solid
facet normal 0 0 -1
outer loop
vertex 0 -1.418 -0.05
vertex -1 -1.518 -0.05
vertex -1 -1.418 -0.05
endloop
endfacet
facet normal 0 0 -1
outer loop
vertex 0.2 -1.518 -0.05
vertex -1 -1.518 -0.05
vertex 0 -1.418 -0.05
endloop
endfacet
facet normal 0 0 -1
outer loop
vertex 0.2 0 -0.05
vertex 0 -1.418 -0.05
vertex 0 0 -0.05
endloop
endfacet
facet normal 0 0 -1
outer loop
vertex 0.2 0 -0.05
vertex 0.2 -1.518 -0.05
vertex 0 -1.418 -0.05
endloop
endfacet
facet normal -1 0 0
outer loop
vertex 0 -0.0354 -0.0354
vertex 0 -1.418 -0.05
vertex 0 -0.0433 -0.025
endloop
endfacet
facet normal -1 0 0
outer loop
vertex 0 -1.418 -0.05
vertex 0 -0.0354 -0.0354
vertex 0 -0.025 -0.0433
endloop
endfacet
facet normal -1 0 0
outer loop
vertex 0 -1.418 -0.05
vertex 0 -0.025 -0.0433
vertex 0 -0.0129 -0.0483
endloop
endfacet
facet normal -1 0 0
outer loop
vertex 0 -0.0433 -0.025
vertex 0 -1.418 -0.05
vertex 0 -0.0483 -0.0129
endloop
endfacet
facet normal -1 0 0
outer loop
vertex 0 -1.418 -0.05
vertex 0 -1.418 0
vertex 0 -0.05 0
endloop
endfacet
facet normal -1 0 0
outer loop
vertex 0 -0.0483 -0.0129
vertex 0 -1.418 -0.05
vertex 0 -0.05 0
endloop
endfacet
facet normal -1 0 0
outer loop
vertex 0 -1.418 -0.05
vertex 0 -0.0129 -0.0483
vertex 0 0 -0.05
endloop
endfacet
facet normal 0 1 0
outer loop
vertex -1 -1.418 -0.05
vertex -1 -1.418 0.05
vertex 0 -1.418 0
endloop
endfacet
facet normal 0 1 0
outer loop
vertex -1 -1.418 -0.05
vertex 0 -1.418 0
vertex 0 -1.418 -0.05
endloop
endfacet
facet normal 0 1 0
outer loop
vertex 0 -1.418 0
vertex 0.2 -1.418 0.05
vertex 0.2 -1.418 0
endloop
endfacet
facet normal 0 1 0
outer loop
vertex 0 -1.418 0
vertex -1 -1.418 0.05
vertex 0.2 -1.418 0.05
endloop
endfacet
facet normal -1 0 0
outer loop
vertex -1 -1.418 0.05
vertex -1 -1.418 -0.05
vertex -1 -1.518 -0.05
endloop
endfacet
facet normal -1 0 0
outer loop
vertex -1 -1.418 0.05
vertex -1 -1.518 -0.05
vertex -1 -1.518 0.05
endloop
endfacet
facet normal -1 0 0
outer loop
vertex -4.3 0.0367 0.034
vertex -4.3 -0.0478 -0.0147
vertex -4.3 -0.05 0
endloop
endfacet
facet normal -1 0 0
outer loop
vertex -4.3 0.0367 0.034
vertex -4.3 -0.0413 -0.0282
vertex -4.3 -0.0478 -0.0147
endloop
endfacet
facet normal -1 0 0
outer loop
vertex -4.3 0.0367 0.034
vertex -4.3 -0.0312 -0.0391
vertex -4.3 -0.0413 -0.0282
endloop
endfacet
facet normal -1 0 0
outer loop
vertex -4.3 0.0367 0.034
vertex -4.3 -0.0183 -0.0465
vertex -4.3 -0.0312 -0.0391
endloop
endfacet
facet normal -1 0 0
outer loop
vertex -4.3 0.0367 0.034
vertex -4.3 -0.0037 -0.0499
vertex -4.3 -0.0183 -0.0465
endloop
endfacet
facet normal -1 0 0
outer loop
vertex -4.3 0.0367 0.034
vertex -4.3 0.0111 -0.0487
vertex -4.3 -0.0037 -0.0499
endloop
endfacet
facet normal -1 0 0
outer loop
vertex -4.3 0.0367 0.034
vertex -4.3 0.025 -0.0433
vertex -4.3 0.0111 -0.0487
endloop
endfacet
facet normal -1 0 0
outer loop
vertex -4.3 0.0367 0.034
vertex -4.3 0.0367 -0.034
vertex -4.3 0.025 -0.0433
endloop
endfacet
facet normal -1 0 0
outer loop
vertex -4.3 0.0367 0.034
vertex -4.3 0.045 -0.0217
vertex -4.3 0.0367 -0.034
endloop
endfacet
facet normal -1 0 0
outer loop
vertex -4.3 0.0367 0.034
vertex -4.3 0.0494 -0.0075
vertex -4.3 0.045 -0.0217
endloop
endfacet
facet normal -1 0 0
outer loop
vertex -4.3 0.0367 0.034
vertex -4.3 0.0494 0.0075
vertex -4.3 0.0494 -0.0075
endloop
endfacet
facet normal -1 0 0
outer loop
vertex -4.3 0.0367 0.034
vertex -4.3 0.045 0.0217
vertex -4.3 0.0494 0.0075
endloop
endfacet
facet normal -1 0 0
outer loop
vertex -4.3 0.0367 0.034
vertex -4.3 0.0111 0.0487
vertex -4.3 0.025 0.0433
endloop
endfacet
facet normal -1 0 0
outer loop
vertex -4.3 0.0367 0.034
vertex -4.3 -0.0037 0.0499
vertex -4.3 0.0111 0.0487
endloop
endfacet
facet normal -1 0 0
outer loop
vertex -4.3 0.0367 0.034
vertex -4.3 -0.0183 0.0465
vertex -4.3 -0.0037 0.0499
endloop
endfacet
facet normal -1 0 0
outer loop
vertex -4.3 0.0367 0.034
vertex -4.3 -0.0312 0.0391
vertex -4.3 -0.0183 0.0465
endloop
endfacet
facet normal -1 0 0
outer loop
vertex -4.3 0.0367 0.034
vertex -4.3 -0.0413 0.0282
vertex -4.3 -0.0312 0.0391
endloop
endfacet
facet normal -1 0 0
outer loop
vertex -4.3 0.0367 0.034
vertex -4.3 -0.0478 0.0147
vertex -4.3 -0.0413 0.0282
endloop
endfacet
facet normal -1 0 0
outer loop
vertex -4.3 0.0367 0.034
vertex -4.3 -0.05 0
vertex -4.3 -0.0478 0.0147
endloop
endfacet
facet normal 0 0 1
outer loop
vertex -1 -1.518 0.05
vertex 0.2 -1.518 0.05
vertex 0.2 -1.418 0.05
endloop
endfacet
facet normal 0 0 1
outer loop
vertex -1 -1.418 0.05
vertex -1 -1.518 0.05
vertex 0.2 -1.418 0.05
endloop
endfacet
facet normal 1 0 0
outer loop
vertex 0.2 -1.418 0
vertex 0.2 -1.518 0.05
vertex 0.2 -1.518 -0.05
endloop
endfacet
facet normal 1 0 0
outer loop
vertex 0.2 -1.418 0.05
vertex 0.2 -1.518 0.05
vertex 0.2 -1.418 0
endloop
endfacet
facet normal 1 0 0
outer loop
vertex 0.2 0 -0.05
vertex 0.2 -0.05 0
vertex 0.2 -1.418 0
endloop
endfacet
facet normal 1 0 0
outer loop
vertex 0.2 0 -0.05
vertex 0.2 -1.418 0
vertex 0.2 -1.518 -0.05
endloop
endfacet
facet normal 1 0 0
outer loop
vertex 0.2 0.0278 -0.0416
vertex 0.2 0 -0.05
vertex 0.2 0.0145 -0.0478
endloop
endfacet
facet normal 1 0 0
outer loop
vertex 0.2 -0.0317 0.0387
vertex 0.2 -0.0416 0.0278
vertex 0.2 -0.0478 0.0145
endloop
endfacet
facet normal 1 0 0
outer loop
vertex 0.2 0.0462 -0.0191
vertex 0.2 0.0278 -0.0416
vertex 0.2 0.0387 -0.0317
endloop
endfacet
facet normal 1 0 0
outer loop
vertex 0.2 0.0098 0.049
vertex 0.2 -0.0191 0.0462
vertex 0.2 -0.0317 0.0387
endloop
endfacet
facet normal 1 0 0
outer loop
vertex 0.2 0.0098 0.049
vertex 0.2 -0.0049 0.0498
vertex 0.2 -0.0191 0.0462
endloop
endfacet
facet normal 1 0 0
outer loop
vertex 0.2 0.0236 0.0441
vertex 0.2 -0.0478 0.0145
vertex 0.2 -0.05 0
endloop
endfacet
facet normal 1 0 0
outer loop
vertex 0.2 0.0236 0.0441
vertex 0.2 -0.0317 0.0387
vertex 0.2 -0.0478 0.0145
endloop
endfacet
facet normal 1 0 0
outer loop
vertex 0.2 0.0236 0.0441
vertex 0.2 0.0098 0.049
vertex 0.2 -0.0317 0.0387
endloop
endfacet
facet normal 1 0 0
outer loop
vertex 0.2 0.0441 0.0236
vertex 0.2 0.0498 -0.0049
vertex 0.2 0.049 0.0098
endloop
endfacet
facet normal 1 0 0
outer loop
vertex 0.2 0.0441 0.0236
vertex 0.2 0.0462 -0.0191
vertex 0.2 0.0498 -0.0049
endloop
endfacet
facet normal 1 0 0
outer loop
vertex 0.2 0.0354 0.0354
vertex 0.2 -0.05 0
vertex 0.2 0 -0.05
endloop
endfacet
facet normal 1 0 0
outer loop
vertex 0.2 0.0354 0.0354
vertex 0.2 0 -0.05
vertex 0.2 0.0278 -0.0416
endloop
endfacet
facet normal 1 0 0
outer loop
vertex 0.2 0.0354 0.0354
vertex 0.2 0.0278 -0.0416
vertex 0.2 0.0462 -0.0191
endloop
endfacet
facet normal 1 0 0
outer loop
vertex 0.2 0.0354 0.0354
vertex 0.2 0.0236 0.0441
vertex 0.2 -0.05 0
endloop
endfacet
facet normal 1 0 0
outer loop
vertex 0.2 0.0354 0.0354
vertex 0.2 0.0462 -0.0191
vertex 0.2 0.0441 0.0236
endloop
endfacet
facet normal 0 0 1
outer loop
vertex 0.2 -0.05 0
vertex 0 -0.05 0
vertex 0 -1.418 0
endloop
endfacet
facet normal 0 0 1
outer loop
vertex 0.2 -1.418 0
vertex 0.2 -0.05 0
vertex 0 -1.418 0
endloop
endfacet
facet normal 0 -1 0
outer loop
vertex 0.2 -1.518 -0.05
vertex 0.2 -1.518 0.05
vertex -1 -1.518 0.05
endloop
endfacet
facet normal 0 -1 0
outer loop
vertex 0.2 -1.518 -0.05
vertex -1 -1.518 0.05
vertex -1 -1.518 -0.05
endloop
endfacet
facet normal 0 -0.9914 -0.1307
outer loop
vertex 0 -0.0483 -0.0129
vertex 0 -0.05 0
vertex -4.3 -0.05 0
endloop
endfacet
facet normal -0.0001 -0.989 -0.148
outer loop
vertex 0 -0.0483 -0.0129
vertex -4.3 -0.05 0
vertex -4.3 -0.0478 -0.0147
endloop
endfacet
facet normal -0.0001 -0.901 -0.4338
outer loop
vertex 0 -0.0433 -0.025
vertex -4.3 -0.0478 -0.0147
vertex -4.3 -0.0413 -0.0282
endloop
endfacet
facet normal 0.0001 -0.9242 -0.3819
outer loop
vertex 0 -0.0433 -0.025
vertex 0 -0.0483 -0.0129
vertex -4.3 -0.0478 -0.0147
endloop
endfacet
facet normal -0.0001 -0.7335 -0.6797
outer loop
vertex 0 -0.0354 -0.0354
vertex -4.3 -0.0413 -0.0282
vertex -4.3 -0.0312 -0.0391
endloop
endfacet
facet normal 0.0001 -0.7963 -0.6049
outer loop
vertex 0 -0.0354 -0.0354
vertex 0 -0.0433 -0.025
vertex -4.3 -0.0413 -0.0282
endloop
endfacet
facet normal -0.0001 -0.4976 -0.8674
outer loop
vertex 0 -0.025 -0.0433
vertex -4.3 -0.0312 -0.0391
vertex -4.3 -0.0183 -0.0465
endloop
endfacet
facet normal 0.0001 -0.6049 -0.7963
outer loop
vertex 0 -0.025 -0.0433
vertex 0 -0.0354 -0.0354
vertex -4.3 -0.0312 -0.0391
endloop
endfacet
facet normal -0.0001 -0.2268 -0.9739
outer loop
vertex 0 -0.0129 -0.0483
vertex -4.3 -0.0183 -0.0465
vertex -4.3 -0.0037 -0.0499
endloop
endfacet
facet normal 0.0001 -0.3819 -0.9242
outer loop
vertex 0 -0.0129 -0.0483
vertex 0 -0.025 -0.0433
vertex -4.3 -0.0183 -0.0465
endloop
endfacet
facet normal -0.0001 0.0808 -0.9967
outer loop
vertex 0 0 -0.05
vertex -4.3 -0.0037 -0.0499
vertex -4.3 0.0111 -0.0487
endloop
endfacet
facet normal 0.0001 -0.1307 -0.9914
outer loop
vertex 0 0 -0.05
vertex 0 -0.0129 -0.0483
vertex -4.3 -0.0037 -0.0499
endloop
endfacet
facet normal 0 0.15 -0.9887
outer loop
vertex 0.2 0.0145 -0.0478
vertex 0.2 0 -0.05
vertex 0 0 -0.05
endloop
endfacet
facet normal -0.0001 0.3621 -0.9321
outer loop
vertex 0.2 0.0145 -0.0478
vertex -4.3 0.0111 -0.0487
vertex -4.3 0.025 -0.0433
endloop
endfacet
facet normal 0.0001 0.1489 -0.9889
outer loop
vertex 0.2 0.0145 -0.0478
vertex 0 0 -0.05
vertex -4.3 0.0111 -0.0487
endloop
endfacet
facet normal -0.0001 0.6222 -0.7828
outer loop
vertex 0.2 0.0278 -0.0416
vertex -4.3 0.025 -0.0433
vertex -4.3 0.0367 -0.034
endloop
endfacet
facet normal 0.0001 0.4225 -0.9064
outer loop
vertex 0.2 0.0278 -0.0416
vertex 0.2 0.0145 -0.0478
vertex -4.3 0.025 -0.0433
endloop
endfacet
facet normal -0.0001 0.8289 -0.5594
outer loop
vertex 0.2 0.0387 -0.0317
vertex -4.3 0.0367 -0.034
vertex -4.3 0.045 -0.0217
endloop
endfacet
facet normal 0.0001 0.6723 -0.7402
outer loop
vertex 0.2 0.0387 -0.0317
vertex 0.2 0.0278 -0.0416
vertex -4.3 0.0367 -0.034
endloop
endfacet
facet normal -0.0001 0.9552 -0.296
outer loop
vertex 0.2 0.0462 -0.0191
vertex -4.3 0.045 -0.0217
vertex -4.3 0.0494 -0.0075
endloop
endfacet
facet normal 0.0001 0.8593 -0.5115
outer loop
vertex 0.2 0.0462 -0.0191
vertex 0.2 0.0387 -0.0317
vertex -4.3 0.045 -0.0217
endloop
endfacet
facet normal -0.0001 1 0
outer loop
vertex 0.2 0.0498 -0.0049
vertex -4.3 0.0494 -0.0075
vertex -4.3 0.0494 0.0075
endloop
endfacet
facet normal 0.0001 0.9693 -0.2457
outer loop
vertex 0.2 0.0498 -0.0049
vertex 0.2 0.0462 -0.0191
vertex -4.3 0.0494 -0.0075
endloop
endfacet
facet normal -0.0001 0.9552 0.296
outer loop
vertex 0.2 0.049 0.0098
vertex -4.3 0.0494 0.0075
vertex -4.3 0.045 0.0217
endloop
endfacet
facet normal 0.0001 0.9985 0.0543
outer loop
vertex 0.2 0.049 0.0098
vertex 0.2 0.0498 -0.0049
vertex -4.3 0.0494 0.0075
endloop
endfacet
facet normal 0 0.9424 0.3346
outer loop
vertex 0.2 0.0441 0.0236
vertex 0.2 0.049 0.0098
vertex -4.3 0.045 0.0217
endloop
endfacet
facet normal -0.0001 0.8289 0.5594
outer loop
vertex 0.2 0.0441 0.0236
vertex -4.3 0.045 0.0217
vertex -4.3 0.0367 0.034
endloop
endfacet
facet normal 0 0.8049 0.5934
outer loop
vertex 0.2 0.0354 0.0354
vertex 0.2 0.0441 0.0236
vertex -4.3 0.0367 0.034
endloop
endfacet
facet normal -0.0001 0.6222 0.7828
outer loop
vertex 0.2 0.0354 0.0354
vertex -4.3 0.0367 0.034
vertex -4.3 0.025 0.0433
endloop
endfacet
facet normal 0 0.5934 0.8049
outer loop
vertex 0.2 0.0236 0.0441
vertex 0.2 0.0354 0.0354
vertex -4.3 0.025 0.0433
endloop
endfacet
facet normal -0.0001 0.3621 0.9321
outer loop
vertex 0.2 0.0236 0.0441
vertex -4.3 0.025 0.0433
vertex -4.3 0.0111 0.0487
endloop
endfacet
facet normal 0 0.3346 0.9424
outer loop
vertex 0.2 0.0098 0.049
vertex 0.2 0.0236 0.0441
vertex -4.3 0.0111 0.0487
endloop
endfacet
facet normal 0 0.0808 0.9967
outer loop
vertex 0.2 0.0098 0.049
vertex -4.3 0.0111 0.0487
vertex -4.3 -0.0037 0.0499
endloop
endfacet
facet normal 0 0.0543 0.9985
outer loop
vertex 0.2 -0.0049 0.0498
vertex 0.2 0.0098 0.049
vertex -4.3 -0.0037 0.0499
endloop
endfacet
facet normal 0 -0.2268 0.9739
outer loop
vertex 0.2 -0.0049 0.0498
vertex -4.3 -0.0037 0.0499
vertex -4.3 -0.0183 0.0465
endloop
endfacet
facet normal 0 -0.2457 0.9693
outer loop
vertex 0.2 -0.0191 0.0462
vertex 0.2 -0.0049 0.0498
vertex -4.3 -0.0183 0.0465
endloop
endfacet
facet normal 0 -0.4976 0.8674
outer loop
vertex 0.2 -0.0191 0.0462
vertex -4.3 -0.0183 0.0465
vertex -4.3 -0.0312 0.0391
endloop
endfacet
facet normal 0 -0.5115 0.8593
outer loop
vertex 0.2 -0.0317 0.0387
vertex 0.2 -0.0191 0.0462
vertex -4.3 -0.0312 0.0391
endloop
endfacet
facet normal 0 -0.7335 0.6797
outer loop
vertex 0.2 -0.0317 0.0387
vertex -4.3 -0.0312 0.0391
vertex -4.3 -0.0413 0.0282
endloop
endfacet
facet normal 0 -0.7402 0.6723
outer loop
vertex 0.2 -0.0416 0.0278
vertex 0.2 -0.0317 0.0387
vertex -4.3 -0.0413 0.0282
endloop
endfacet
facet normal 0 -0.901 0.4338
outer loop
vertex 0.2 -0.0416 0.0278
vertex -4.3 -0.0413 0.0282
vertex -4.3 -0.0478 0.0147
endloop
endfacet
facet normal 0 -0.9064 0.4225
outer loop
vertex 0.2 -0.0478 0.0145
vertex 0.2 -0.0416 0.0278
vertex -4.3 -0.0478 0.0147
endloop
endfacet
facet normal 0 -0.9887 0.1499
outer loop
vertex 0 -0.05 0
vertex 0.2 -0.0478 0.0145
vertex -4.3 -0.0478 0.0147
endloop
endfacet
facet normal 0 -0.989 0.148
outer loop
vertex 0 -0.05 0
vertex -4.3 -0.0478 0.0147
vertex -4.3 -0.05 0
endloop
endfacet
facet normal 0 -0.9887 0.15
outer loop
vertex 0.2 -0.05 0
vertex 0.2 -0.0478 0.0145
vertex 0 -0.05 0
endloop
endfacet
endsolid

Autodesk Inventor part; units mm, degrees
ref_plane "YZ Plane" through (0, 0, 0) normal (1, 0, 0) x (0, 1, 0)
ref_plane "XZ Plane" through (0, 0, 0) normal (0, 1, 0) x (-1, 0, 0)
ref_plane "XY Plane" through (0, 0, 0) normal (0, 0, 1) x (1, 0, 0)
sketch "Sketch1" plane through (0, 0, 0) normal (1, 0, 0) x (0, 1, 0)
  circle A0 centre (0, 0) radius 0.05
  line L0 (0, 0) -> (-1.468, 0)
  line L1 (-1.518, 0.05) -> (-1.418, 0.05)
  line L2 (-1.418, 0.05) -> (-1.418, -0.05)
  line L3 (-1.418, -0.05) -> (-1.518, -0.05)
  line L4 (-1.518, -0.05) -> (-1.518, 0.05)
  line L5 (-1.518, 0.05) -> (-1.418, -0.05) construction
  line L6 (-1.418, 0.05) -> (-1.518, -0.05) construction
  line L7 (-1.418, -0.05) -> (0, -0.05)
  point P0 (-0.05, 0)
  point P1 (-1.418, 0)
  dimension "d0" = 0.1
  dimension "d1" = 1.468
  dimension "d2" = 0.1
  dimension "d3" = 0.1
extrude "Extrusion1" add sketch "Sketch1" along normal blind 0.2
sketch "Sketch2" plane through (0, 0, 0) normal (-1, 0, 0) x (0, 0, 1)
  arc A0 (0, -0.05) -> (-0.05, 0) centre (0, 0) ccw projected
  circle A1 centre (0, 0) radius 0.05
  point P0 (-0.05, 0)
  point P1 (0, -0.05)
  dimension "d6" = 0.1
extrude "Extrusion2" add sketch "Sketch2" along normal blind 4.3
sketch "Sketch3" plane through (0, 0, 0) normal (-1, 0, 0) x (0, 0, 1)
  line L0 (-0.05, -1.518) -> (-0.05, 0) projected
  line L1 (0.05, -1.518) -> (-0.05, -1.518) projected
  line L2 (-0.05, -1.518) -> (0.05, -1.518)
  line L3 (0, -1.418) -> (0.05, -1.418) projected
  line L4 (0.05, -1.518) -> (0.05, -1.418)
  line L5 (0.05, -1.418) -> (-0.05, -1.418)
  line L6 (-0.05, -1.418) -> (-0.05, -1.518)
  point P0 (0, 0)
extrude "Extrusion3" add sketch "Sketch3" along normal blind 1
properties part number "Bone23_22_Fix"
